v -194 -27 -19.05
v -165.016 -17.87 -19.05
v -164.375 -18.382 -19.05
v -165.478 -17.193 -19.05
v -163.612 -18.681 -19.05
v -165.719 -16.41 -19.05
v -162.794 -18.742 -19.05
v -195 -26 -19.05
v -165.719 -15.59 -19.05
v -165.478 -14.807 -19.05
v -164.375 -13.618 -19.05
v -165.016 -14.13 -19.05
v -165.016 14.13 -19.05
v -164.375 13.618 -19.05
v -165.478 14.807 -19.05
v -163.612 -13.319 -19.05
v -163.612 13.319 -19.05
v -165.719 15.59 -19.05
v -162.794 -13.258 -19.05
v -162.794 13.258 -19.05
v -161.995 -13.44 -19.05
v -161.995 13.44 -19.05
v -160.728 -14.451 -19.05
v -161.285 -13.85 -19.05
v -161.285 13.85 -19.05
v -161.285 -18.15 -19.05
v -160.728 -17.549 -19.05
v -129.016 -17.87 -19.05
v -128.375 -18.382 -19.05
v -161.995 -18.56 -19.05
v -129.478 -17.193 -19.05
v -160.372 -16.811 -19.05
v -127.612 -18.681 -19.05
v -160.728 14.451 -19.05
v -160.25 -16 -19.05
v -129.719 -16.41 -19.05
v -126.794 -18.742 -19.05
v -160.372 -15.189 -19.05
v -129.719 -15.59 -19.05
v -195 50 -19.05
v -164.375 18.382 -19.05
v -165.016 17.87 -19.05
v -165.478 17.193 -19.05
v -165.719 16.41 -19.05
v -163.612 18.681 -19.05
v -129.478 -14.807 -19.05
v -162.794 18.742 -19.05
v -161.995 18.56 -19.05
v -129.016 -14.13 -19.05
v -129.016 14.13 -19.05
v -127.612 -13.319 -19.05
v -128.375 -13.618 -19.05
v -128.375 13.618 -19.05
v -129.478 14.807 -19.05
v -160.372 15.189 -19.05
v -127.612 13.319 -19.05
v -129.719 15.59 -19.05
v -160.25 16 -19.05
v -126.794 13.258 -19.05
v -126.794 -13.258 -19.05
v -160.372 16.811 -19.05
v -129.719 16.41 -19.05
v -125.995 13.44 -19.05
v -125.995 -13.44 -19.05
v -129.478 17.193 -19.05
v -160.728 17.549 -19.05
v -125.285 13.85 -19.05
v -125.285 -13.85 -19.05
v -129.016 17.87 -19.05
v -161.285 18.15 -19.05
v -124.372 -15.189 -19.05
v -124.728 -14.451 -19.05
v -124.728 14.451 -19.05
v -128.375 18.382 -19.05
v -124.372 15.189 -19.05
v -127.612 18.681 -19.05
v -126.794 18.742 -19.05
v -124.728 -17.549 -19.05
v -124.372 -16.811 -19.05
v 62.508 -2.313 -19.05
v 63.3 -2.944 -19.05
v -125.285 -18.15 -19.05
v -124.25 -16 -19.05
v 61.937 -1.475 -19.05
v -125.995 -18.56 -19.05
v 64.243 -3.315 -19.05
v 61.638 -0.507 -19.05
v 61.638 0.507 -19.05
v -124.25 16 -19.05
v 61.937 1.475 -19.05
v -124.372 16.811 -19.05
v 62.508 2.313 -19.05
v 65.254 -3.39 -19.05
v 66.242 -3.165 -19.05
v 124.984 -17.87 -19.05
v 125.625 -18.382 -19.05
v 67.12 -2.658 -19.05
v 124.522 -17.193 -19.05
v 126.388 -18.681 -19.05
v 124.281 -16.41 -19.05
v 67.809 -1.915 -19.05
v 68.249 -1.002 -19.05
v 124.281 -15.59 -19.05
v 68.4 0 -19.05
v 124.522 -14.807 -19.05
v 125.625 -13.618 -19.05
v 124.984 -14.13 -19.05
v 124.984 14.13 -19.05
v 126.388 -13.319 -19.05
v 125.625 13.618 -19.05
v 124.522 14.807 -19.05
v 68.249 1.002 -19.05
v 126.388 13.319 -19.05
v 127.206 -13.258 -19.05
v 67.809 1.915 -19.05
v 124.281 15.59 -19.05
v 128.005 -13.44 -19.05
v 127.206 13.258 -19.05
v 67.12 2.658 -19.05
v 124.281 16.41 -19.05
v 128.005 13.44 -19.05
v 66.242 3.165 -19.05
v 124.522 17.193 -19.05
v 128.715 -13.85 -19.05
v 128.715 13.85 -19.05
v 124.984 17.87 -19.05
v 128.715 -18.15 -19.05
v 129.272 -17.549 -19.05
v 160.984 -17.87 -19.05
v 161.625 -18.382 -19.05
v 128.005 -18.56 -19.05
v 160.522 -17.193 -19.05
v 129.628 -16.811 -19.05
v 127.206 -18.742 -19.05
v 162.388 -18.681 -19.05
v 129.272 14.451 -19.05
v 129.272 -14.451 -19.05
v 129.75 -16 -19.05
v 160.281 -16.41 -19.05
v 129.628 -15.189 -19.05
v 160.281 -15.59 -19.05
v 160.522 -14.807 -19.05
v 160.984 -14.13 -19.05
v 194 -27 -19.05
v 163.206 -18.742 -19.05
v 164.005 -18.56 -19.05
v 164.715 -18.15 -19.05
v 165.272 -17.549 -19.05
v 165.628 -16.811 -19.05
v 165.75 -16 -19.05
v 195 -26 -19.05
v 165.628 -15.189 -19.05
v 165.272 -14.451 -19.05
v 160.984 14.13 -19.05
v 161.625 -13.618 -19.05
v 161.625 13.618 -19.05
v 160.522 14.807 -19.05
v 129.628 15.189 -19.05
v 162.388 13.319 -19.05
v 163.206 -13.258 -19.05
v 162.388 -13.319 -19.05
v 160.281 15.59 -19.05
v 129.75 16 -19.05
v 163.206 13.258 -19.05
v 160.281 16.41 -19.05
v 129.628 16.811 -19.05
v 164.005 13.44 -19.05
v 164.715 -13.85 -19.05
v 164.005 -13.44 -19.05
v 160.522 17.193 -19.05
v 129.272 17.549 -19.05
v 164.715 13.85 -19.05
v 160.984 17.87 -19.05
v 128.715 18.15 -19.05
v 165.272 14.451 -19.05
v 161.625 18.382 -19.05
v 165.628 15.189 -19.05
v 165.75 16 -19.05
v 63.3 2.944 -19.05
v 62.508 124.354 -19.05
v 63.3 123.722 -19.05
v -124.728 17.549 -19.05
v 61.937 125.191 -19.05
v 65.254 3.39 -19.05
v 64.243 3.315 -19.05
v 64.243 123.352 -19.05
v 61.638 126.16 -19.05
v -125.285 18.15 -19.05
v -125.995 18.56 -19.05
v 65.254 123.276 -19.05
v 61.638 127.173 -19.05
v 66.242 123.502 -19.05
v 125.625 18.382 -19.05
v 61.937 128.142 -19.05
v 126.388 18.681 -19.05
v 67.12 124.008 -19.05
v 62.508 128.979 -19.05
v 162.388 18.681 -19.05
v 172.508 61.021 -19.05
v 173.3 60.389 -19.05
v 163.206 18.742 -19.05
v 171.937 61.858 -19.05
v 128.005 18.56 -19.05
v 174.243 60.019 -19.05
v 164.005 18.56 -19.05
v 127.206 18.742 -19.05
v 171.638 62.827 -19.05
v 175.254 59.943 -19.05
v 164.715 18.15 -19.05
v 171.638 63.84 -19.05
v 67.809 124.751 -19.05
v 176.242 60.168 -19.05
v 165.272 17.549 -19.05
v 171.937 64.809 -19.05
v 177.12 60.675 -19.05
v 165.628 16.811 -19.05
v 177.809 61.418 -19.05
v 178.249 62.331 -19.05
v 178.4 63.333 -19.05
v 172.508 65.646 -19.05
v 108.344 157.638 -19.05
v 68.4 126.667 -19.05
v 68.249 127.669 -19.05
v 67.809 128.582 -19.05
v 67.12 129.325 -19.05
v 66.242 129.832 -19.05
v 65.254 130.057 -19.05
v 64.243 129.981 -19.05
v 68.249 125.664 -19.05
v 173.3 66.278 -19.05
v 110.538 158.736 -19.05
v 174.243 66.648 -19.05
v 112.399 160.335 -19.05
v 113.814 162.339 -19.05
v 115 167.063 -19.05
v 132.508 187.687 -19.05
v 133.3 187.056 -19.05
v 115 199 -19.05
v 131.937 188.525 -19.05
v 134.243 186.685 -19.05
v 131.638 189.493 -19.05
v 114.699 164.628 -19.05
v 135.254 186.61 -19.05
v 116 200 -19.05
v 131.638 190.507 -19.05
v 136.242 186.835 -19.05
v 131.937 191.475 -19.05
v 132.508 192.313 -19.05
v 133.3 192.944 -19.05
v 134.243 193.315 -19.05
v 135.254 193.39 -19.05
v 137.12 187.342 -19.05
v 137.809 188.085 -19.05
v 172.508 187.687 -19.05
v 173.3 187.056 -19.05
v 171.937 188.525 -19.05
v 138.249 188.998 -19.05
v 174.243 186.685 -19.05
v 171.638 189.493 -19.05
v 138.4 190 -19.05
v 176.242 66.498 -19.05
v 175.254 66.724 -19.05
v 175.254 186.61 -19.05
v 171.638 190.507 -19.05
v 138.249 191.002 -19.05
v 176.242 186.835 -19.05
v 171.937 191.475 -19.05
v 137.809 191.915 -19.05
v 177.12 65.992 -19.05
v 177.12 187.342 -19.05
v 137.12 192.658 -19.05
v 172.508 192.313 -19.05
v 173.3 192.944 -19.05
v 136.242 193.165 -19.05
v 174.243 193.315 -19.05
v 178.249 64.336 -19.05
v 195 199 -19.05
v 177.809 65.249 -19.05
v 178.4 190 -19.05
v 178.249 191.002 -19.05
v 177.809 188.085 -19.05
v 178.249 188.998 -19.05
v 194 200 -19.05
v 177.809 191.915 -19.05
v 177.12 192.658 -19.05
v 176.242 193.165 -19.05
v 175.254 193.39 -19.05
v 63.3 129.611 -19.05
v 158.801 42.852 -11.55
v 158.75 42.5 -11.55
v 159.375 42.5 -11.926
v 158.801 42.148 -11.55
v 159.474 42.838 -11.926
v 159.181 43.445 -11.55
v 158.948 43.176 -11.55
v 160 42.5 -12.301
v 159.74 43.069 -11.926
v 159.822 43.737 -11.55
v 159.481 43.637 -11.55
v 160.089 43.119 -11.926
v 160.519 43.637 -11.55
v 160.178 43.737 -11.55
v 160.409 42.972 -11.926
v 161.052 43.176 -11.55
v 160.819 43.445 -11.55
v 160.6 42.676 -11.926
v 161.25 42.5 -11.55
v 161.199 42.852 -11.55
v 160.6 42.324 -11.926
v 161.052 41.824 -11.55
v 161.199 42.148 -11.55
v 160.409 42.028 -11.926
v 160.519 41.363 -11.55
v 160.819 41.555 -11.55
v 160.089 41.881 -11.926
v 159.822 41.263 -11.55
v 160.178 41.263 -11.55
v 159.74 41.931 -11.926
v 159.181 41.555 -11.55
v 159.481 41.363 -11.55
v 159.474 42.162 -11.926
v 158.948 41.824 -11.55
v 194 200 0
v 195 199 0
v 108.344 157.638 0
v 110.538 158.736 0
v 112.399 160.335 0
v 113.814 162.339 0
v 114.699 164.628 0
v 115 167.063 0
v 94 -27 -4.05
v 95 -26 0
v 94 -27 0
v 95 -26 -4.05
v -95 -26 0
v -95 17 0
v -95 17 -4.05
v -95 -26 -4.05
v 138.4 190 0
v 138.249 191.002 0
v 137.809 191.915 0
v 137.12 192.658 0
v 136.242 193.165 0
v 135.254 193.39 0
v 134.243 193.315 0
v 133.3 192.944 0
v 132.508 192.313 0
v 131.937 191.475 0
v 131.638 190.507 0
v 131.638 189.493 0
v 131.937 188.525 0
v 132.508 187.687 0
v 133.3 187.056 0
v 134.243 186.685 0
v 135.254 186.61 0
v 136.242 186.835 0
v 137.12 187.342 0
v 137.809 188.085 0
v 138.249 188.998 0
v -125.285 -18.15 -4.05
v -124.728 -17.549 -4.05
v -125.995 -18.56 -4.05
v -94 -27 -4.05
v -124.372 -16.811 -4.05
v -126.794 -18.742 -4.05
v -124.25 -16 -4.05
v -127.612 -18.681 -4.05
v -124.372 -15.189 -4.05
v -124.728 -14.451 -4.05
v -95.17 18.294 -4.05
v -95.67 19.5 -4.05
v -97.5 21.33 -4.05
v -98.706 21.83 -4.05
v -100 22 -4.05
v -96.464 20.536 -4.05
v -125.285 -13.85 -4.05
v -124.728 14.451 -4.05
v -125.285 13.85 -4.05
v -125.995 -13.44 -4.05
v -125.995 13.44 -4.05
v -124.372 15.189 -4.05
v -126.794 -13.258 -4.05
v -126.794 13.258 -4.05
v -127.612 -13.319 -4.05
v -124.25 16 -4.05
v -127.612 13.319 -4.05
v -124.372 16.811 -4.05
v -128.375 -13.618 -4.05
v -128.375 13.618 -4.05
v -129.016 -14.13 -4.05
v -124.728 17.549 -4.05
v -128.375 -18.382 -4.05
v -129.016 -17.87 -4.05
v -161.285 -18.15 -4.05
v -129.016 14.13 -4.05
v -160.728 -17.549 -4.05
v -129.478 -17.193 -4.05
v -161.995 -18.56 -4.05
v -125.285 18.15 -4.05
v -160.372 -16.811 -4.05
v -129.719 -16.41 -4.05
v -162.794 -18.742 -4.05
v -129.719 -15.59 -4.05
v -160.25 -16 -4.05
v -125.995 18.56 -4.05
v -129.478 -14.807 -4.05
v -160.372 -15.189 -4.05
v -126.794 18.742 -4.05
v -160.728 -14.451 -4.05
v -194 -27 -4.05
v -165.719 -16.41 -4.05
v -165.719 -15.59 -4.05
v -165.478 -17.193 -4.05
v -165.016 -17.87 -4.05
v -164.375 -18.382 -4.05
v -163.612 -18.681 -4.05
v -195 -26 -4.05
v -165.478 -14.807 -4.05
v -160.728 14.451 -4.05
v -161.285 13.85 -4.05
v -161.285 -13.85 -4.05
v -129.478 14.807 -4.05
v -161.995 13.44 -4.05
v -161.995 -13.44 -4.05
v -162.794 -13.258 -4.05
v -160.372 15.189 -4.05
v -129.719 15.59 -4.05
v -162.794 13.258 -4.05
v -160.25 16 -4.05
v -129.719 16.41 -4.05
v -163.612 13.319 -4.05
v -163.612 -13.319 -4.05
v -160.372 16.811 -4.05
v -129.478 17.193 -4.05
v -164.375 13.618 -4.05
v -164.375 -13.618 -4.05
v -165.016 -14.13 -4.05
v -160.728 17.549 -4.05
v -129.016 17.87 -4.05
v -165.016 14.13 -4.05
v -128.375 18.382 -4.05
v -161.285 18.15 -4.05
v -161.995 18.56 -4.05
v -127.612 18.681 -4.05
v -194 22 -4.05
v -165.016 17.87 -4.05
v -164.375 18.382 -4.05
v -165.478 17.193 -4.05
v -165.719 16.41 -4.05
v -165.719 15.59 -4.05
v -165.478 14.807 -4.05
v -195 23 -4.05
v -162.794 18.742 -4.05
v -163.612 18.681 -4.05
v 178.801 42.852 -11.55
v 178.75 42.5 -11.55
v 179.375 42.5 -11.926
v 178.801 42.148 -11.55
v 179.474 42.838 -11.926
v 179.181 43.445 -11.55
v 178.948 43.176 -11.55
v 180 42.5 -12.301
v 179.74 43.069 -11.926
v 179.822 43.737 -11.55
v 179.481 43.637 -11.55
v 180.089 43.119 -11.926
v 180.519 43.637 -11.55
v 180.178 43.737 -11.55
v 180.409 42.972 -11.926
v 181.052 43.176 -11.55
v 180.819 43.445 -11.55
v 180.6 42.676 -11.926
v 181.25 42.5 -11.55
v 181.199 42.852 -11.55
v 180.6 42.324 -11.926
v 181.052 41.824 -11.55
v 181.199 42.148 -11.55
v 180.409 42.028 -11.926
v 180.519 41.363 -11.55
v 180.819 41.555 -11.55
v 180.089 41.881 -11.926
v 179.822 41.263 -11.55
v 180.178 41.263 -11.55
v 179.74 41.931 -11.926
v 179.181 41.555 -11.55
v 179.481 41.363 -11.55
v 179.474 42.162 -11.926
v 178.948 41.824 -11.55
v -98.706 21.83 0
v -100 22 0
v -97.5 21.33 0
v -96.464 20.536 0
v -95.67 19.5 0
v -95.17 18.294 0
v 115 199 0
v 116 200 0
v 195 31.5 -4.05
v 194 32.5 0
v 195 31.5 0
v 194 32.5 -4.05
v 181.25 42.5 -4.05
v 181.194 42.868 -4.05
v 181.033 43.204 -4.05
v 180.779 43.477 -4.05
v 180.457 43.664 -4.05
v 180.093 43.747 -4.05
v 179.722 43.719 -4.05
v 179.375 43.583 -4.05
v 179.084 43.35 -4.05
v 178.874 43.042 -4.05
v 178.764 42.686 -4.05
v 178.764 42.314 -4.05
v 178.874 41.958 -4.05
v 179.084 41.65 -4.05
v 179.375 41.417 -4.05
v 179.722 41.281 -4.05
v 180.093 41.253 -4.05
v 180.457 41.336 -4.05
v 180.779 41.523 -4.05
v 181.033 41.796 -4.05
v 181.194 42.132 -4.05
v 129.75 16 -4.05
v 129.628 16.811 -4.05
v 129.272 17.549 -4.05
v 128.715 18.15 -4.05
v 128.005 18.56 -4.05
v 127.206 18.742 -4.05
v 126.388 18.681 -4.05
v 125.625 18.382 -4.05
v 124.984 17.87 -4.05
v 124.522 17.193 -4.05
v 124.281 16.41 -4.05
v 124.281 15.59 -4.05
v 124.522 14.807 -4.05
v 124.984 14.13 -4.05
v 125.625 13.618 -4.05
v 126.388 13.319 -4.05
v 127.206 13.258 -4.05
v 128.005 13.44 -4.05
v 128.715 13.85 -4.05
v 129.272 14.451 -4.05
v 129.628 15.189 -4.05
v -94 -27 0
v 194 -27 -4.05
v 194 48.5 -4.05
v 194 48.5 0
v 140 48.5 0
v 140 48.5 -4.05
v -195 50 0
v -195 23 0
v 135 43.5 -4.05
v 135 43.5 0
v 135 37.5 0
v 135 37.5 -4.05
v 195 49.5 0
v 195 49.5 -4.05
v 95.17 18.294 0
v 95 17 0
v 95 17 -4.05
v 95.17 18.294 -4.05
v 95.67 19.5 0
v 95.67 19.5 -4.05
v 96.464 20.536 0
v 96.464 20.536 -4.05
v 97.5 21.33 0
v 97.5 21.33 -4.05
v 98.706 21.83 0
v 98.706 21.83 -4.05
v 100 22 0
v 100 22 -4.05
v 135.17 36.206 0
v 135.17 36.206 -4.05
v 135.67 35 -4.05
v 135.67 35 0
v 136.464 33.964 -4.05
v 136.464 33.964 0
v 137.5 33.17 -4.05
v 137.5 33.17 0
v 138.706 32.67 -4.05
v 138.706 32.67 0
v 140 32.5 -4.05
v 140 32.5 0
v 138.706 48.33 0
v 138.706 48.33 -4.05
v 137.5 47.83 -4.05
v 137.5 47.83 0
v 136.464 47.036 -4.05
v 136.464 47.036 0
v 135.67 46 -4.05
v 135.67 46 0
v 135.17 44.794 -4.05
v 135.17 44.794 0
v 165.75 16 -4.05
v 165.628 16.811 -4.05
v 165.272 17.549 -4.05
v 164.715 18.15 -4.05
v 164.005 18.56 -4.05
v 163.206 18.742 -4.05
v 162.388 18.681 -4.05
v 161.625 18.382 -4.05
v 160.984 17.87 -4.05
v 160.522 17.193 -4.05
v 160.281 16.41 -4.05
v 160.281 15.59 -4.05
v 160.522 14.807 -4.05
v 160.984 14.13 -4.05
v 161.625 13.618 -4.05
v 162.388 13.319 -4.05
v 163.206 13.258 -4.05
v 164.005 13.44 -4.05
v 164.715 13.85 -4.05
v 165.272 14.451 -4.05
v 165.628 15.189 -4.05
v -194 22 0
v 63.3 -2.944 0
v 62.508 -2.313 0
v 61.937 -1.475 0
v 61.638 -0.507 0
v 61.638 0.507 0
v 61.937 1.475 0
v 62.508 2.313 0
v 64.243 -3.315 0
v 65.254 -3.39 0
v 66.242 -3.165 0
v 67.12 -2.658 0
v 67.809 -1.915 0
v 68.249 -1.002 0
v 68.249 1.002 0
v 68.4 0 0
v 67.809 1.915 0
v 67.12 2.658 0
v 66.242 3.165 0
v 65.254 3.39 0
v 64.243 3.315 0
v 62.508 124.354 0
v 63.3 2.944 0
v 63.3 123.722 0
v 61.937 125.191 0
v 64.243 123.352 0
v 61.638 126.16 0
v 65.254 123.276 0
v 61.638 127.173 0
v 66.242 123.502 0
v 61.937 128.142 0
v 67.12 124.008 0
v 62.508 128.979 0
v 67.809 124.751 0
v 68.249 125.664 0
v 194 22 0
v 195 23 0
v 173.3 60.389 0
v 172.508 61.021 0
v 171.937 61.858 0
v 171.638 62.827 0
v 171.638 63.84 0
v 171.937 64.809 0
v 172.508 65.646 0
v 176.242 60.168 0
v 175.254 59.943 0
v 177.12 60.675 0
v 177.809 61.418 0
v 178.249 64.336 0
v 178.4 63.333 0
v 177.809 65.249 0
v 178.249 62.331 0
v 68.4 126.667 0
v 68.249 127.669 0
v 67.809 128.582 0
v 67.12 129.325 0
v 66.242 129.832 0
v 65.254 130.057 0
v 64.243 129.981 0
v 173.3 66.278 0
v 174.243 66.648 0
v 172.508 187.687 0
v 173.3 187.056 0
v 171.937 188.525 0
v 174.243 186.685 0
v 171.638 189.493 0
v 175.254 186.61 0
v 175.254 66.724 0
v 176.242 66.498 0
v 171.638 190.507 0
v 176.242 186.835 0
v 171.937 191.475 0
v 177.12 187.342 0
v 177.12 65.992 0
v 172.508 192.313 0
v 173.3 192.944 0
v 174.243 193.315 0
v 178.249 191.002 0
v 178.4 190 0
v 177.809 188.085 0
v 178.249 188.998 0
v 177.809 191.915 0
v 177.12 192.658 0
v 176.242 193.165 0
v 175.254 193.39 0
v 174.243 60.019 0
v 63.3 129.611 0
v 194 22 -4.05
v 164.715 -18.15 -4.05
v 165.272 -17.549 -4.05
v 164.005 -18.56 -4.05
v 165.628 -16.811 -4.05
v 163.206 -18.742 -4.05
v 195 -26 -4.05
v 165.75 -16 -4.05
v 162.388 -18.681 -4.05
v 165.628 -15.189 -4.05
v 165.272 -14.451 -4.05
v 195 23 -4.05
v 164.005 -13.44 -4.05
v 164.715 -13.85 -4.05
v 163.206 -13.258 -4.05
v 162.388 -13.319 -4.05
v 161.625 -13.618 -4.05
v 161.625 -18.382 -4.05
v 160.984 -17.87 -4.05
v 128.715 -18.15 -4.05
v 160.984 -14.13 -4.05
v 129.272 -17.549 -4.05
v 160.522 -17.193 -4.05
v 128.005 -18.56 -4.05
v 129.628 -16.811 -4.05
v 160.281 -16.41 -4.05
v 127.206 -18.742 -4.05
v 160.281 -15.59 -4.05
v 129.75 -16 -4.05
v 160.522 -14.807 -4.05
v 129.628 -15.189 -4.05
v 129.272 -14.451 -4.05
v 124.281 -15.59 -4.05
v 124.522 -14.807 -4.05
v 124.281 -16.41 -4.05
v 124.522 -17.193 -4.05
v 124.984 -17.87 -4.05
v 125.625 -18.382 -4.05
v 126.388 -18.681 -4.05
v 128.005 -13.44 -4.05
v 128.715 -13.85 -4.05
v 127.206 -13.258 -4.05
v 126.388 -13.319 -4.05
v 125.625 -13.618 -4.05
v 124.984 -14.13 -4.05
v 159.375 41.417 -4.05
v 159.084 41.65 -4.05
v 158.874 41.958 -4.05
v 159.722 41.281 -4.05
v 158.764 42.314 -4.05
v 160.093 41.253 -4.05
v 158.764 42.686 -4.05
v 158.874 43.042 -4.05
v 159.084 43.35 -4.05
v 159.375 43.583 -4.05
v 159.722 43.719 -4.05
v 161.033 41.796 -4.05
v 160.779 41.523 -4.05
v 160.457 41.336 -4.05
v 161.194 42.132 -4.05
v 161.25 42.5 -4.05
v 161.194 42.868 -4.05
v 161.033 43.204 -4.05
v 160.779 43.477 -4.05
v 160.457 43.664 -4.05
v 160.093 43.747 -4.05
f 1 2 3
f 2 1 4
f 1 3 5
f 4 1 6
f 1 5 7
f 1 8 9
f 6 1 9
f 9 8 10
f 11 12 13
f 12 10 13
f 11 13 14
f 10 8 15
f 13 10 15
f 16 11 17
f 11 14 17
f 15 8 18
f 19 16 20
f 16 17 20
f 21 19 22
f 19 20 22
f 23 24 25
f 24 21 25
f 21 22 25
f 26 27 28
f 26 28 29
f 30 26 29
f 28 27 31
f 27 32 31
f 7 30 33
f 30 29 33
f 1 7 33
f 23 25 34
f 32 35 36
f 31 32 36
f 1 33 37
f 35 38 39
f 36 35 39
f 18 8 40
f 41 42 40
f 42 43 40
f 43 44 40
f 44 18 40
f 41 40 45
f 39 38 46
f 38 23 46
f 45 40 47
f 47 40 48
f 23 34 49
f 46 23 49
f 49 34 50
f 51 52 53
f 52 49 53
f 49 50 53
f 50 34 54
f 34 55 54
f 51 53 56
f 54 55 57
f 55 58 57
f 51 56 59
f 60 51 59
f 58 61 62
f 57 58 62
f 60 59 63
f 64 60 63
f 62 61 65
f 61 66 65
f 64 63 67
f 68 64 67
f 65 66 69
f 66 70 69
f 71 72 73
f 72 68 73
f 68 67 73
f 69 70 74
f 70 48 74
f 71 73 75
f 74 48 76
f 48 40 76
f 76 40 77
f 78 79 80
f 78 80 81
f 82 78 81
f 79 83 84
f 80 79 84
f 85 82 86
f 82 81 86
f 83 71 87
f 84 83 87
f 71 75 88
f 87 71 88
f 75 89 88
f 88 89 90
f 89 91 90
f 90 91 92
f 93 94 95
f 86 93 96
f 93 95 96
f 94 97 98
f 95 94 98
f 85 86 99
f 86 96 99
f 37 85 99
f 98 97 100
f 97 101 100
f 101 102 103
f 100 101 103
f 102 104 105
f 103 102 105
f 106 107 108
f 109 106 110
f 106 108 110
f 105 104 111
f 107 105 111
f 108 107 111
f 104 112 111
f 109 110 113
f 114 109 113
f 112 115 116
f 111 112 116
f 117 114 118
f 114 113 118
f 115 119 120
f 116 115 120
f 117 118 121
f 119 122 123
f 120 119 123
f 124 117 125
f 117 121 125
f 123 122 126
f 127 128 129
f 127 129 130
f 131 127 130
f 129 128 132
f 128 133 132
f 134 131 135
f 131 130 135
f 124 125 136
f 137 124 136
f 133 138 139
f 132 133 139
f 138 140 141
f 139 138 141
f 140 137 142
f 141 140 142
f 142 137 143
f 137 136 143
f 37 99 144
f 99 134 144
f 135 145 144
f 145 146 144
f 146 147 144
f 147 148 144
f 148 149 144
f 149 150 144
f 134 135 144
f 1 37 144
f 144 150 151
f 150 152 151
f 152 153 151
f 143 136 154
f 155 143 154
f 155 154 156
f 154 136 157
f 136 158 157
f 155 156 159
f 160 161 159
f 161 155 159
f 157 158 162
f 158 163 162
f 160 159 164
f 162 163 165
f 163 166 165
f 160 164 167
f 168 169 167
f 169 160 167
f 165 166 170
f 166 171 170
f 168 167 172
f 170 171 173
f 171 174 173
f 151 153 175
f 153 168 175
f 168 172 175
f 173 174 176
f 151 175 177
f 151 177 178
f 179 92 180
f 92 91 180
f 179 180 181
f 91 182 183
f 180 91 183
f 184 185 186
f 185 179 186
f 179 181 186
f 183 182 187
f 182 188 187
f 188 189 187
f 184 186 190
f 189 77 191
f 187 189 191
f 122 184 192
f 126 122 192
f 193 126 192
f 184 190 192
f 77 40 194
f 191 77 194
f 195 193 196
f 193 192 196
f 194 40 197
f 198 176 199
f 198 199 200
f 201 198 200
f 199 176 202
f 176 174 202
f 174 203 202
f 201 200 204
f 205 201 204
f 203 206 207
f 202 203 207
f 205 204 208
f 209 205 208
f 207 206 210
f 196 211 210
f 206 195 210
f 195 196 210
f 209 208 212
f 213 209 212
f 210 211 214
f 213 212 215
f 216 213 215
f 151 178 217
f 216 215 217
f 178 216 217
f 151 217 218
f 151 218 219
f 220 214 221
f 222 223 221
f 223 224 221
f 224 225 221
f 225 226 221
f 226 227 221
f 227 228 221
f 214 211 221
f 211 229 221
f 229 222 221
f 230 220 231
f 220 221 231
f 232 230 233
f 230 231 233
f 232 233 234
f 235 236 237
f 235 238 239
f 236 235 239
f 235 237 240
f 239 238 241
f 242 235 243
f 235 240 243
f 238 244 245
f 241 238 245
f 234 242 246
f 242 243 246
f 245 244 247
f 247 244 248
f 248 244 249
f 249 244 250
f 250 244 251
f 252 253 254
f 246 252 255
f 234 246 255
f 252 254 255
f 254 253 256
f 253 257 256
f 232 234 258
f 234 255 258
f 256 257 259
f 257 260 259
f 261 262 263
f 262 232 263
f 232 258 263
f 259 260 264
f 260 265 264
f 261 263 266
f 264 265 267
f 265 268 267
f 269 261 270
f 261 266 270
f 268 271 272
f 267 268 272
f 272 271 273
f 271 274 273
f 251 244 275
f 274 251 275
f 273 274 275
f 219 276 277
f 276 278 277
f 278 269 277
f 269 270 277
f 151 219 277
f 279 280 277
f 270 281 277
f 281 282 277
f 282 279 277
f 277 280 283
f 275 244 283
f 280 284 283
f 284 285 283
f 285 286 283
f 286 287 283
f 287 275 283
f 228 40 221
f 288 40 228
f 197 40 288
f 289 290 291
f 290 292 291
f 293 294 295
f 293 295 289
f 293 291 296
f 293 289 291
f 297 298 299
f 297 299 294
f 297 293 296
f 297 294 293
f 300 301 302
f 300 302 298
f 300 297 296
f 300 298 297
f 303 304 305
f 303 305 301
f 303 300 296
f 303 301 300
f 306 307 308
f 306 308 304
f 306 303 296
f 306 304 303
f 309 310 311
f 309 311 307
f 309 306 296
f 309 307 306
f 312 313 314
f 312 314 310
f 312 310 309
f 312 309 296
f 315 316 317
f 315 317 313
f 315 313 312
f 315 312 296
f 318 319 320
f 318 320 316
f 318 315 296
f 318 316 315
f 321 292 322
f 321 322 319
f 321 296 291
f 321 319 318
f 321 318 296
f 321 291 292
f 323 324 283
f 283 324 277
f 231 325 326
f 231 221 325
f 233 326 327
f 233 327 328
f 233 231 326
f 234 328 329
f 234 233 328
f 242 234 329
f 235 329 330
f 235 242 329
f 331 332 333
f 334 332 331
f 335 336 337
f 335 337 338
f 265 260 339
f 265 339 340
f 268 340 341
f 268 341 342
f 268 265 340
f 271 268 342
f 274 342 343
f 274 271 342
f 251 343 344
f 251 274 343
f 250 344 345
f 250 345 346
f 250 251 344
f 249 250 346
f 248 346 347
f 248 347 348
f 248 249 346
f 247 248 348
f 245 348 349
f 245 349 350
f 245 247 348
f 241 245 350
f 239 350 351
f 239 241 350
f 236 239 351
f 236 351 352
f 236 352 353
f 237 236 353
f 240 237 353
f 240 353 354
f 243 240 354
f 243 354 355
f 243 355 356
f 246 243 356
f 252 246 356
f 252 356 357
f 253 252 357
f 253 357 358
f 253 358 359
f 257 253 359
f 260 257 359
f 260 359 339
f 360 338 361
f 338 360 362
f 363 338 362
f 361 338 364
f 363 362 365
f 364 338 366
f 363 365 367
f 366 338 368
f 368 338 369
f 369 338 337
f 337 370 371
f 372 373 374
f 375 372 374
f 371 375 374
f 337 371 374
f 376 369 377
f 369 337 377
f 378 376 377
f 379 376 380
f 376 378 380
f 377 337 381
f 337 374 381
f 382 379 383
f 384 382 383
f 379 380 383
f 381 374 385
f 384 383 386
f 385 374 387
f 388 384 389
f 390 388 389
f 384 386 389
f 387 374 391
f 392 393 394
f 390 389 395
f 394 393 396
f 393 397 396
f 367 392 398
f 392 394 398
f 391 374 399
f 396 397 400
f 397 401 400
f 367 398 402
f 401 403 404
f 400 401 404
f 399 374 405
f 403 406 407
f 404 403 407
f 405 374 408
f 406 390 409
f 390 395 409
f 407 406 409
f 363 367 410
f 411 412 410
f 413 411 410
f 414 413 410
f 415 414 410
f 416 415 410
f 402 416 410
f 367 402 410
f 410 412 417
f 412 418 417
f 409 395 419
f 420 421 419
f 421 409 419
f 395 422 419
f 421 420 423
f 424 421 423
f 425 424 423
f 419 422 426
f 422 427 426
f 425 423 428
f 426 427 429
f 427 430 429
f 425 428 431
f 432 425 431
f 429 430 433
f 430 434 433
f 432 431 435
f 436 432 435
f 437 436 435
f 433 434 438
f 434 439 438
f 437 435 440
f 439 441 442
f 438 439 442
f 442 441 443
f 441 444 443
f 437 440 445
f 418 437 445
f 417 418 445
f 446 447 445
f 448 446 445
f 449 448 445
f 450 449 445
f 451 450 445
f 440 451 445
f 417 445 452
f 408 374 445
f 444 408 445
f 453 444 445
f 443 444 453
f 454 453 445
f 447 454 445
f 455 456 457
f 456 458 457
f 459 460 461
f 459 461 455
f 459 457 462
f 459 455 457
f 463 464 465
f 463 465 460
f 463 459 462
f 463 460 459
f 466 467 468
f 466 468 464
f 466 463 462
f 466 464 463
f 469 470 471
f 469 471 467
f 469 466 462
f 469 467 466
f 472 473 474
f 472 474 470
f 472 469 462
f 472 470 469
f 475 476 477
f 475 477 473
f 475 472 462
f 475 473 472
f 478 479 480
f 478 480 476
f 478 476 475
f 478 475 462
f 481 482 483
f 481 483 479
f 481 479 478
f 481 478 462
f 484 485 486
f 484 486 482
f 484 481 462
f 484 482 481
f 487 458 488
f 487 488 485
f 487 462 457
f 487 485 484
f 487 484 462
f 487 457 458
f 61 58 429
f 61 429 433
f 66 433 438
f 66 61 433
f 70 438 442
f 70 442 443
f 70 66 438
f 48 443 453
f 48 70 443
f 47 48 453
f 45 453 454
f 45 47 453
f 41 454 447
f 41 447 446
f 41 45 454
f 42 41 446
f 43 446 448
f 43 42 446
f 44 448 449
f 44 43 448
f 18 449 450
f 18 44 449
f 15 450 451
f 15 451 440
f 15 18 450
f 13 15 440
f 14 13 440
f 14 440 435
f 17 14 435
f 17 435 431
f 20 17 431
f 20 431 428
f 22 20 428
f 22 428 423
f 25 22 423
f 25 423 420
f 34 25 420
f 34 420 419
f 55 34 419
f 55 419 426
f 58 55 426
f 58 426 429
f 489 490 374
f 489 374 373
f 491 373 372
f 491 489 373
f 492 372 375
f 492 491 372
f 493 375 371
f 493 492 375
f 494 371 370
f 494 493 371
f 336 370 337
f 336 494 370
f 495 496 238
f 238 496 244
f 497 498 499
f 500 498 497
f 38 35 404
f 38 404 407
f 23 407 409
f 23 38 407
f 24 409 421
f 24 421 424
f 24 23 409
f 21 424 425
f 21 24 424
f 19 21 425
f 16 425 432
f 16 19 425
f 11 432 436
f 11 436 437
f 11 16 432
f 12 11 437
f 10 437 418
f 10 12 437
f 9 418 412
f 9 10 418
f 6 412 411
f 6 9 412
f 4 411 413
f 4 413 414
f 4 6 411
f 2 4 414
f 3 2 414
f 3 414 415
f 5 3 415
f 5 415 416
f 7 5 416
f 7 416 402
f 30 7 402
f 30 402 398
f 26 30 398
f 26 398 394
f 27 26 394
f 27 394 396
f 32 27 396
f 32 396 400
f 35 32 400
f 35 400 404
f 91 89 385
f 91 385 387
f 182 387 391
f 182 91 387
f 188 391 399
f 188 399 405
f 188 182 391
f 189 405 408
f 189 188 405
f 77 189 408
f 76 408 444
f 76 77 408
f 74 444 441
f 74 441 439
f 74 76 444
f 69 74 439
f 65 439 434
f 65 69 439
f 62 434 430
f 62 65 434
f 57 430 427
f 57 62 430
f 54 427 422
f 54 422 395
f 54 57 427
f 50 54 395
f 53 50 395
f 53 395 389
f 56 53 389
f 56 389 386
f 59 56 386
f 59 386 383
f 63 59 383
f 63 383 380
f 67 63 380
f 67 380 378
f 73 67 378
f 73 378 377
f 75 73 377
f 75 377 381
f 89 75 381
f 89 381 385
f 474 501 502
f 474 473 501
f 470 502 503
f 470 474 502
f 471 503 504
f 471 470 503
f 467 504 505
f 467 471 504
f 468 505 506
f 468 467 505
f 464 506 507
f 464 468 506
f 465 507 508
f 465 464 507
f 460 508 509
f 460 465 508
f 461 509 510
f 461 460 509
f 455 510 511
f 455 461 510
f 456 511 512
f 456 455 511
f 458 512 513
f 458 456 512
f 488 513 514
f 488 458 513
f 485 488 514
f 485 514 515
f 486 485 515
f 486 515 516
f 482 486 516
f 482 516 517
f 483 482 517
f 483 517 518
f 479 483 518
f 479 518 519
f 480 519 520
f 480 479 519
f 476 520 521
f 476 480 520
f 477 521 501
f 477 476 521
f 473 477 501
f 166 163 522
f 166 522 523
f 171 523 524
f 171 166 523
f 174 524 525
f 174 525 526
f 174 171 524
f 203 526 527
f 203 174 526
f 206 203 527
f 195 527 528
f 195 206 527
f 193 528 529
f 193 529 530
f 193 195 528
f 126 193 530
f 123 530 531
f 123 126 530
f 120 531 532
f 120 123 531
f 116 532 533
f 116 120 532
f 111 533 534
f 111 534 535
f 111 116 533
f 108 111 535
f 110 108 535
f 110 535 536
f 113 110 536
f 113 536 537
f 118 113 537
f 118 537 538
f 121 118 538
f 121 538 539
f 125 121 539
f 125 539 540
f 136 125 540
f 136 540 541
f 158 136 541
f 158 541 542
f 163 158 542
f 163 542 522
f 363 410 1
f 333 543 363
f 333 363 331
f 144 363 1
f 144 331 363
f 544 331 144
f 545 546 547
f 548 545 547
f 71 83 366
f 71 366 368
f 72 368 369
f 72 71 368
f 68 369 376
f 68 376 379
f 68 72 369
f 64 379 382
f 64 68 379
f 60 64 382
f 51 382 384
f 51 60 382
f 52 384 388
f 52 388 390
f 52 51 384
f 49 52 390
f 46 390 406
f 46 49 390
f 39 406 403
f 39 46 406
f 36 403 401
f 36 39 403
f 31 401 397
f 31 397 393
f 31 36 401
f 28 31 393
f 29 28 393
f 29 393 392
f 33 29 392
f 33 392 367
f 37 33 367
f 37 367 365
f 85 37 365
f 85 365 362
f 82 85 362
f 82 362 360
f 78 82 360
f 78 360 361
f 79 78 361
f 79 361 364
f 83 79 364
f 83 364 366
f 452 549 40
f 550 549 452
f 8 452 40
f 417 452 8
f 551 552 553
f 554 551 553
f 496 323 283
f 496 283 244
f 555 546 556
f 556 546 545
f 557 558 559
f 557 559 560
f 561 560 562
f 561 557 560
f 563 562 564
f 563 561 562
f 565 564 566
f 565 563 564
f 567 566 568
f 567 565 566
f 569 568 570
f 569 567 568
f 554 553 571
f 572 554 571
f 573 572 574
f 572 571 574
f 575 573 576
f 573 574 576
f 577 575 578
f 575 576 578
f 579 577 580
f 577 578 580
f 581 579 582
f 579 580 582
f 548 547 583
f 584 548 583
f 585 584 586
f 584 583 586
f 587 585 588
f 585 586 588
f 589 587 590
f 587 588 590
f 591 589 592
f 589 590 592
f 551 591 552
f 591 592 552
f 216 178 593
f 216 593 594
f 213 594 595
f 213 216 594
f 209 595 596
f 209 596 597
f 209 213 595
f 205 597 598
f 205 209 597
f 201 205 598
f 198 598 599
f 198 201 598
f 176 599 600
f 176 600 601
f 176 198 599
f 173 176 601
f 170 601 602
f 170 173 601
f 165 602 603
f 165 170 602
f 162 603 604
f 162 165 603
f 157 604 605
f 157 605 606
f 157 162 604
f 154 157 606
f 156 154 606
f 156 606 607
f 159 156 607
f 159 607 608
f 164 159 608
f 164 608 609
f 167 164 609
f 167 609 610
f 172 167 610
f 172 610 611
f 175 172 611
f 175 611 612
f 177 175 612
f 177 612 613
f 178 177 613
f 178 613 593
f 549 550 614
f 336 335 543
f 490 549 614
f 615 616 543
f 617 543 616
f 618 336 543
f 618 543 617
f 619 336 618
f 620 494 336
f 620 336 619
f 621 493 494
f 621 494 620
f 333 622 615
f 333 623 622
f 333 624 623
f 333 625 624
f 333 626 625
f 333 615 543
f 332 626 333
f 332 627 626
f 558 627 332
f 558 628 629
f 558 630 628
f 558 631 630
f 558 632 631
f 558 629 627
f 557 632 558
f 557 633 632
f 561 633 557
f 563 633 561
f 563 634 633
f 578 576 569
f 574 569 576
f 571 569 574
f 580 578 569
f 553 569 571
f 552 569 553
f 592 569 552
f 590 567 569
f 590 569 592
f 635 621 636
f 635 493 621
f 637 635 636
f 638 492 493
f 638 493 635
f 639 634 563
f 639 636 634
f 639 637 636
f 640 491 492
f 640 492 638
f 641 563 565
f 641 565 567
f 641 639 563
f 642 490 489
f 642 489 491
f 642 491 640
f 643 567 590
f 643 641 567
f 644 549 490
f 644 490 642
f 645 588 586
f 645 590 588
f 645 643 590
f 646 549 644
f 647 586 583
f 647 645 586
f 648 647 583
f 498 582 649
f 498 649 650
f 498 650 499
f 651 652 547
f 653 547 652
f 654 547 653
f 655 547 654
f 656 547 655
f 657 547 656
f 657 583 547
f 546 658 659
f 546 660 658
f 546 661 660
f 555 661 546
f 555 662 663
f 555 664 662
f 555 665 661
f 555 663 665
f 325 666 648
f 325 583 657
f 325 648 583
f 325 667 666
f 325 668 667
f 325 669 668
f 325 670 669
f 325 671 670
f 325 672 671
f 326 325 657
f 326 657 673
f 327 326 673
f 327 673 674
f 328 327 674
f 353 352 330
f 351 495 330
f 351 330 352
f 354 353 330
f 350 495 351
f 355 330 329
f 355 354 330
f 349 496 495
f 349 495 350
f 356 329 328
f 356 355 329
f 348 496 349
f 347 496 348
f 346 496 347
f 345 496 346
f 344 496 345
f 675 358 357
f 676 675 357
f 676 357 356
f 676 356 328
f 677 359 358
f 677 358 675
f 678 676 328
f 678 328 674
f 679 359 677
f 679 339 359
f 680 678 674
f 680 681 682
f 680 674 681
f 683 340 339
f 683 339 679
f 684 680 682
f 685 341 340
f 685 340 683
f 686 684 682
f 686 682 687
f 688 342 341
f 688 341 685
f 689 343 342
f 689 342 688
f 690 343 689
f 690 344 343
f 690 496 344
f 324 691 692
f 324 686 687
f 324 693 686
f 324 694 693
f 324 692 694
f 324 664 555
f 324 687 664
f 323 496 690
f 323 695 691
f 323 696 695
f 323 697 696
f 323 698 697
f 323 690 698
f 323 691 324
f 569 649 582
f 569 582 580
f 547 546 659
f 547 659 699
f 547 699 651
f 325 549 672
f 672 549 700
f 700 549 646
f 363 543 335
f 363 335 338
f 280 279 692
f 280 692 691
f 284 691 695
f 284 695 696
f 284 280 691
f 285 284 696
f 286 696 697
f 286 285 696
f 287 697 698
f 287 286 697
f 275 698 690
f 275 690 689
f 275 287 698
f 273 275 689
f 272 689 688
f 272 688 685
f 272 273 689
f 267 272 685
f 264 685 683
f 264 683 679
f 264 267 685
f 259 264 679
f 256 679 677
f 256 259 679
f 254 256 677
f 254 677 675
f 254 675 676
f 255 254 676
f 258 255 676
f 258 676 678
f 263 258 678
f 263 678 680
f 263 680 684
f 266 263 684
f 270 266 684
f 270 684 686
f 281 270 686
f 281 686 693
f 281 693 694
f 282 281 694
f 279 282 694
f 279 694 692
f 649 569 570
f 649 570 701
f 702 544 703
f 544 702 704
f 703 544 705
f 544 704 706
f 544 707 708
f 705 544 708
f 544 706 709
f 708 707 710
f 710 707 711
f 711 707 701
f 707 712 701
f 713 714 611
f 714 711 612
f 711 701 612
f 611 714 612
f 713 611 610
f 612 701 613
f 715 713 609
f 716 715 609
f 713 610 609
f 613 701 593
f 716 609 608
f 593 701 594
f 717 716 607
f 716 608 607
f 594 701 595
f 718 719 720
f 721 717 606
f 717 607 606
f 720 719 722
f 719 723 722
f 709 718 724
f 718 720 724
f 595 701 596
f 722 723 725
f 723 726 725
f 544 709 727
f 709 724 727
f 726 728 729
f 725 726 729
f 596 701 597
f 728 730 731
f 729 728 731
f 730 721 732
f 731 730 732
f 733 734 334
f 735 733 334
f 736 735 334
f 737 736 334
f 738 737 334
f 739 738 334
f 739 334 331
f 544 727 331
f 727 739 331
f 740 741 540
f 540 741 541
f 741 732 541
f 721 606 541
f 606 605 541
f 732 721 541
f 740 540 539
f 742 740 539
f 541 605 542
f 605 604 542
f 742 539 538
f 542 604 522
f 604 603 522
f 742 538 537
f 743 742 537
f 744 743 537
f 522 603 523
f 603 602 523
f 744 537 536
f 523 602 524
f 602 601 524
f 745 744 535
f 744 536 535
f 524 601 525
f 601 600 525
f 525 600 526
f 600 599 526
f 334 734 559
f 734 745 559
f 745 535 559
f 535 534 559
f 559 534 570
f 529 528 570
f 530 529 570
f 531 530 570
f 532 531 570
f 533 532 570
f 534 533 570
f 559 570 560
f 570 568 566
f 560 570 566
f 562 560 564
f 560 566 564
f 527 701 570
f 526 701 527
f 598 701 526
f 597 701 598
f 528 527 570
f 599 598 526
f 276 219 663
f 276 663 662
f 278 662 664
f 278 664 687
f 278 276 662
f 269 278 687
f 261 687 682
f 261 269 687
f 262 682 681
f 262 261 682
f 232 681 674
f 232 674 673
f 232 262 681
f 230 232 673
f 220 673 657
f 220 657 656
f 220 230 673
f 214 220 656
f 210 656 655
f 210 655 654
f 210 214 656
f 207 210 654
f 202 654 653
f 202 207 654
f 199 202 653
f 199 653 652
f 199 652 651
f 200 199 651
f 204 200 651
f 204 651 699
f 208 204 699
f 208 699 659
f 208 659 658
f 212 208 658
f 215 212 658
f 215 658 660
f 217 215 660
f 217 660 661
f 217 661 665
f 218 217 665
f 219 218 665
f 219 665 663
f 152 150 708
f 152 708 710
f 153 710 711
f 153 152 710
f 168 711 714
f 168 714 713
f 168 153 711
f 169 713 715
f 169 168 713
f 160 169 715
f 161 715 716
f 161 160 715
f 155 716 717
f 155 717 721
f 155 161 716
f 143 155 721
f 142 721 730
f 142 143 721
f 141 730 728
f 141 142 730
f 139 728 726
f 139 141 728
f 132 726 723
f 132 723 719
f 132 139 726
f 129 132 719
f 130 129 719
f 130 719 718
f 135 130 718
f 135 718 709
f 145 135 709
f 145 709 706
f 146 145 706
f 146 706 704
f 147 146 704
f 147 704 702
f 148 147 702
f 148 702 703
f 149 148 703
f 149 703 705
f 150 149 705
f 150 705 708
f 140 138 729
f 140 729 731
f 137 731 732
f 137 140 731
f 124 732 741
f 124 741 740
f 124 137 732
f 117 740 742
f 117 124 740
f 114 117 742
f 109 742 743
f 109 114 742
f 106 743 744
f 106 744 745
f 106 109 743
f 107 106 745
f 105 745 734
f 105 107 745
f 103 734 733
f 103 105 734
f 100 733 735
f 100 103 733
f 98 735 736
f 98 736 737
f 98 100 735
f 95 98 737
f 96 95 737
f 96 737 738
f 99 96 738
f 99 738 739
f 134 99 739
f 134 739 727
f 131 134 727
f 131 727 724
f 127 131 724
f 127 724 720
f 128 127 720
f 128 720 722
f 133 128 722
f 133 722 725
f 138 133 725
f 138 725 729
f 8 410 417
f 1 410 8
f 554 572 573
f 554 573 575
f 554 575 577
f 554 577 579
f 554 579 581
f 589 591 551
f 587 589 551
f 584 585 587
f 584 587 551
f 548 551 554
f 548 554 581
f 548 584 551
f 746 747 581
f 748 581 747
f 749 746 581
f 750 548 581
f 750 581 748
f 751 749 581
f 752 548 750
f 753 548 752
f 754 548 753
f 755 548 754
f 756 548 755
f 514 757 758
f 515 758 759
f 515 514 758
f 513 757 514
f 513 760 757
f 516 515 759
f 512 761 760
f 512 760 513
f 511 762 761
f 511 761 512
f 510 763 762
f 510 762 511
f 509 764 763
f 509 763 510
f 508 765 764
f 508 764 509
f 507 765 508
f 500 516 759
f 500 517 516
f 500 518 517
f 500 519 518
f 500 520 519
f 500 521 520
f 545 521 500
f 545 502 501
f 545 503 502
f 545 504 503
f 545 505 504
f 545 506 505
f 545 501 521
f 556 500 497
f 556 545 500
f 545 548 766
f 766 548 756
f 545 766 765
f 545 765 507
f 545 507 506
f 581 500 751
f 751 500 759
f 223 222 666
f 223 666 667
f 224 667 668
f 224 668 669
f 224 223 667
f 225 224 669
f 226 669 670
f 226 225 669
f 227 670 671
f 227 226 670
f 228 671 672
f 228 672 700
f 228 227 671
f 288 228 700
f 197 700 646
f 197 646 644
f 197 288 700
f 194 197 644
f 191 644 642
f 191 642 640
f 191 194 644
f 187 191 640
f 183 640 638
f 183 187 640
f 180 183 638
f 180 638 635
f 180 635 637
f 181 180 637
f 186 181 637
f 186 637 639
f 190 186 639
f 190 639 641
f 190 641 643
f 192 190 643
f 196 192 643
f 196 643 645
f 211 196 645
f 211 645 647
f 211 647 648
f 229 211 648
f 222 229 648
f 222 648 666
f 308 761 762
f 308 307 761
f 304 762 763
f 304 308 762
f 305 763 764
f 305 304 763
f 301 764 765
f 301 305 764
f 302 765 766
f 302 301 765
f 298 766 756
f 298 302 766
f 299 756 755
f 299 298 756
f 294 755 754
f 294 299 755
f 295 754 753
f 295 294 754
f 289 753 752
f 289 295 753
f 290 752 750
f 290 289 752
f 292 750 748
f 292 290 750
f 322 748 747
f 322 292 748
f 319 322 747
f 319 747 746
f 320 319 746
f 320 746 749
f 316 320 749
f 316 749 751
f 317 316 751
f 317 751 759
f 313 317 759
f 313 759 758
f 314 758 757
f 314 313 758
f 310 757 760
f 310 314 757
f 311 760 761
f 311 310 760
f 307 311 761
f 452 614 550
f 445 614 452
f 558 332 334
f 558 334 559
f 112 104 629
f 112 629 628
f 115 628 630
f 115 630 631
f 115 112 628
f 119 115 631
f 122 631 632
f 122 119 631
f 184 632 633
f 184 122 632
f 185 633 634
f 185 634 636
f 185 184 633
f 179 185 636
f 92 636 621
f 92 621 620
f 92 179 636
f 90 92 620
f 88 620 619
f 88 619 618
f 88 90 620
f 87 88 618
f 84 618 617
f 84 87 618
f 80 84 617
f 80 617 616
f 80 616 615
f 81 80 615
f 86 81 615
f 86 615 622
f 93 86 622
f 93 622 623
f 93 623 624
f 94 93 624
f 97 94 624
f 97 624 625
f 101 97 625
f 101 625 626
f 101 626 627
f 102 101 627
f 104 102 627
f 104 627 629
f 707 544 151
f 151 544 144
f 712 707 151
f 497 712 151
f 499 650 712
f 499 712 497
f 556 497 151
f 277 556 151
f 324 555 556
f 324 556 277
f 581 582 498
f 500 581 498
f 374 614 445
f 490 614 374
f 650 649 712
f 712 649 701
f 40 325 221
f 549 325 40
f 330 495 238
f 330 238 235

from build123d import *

# Parameters (mm, degrees)
BOSS_EXTRUDE1_DEPTH       = 19.05
CUT_EXTRUDE2_DEPTH        = 4.05
M5_CLEARANCE_HOLE1_D      = 5.5
M5_CLEARANCE_HOLE2_D      = 5.5
M3X0_5_TAPPED_HOLE1_D     = 2.5
M3X0_5_TAPPED_HOLE1_DEPTH = 7.5
M3X0_5_TAPPED_HOLE1_TIP   = 0.751075774
M8X1_25_TAPPED_HOLE1_D    = 6.8
FILLET1_R                 = 10
CHAMFER1_SIZE             = 1


with BuildPart() as part:
    # Sketch1 → Boss-Extrude1 (new body)
    with BuildSketch(Plane.XY):
        Polygon((-195, 50), (-195, -27), (195, -27), (195, 200), (115, 200), (115, 160), align=None)
    extrude(amount=BOSS_EXTRUDE1_DEPTH)

    # Sketch2 → Cut-Extrude2 (cut)
    with BuildSketch(Plane(origin=(0, 0, 0), x_dir=(-1, 0, 0), z_dir=(0, 0, -1))):
        with BuildLine():
            Line((-195, -27), (-95, -27))
            Line((-95, -27), (-95, 17))
            ThreePointArc((-95, 17), (-96.464466094, 20.535533906), (-100, 22))
            Line((-100, 22), (-195, 22))
            Line((-195, 22), (-195, -27))
        make_face()
        with BuildLine():
            Line((195, -27), (195, 22))
            Line((195, 22), (100, 22))
            ThreePointArc((100, 22), (96.464466094, 20.535533906), (95, 17))
            Line((95, 17), (95, -27))
            Line((95, -27), (195, -27))
        make_face()
        with BuildLine():
            Line((-195, 48.5), (-140, 48.5))
            ThreePointArc((-140, 48.5), (-136.464466094, 47.035533906), (-135, 43.5))
            Line((-135, 43.5), (-135, 37.5))
            ThreePointArc((-135, 37.5), (-136.464466094, 33.964466094), (-140, 32.5))
            Line((-140, 32.5), (-195, 32.5))
            Line((-195, 32.5), (-195, 48.5))
        make_face()
    extrude(amount=-CUT_EXTRUDE2_DEPTH, mode=Mode.SUBTRACT)

    # M5 Clearance Hole1 (through all)
    with Locations(Plane(origin=(0, 0, 4.05), x_dir=(-1, 0, 0), z_dir=(0, 0, -1))):
        with Locations((127, 16), (163, 16), (163, -16), (127, -16)):
            Hole(M5_CLEARANCE_HOLE1_D / 2)

    # M5 Clearance Hole2 (through all)
    with Locations(Plane(origin=(0, 0, 4.05), x_dir=(-1, 0, 0), z_dir=(0, 0, -1))):
        with Locations((-163, 16), (-127, 16), (-127, -16), (-163, -16)):
            Hole(M5_CLEARANCE_HOLE2_D / 2)

    # M3x0.5 Tapped Hole1
    with Locations(Plane(origin=(0, 0, 4.05), x_dir=(-1, 0, 0), z_dir=(0, 0, -1))):
        with Locations((-180, 42.5), (-160, 42.5)):
            Hole(M3X0_5_TAPPED_HOLE1_D / 2, depth=M3X0_5_TAPPED_HOLE1_DEPTH)
            with Locations((0, 0, -(M3X0_5_TAPPED_HOLE1_DEPTH + M3X0_5_TAPPED_HOLE1_TIP / 2))):  # 118° drill point
                Cone(0, M3X0_5_TAPPED_HOLE1_D / 2, M3X0_5_TAPPED_HOLE1_TIP, mode=Mode.SUBTRACT)

    # M8x1.25 Tapped Hole1 (through all)
    with Locations(Plane(origin=(0, 0, 0), x_dir=(-1, 0, 0), z_dir=(0, 0, -1))):
        with Locations((-175, 190), (-135, 190), (-65, 126.666666667), (-175, 63.333333333), (-65, 0)):
            Hole(M8X1_25_TAPPED_HOLE1_D / 2)

    # Fillet1
    fillet1_edges = [part.edges().sort_by_distance(p)[0] for p in [
        (115, 160, 9.525),
    ]]
    fillet(fillet1_edges, radius=FILLET1_R)

    # Chamfer1
    chamfer1_edges = [part.edges().sort_by_distance(p)[0] for p in [
        (115, 200, 9.525),
        (195, 200, 9.525),
        (195, -27, 11.55),
        (-195, -27, 11.55),
        (195, 48.5, 2.025),
        (195, 32.5, 2.025),
        (-95, -27, 2.025),
        (-195, 22, 2.025),
        (95, -27, 2.025),
        (195, 22, 2.025),
    ]]
    chamfer(chamfer1_edges, length=CHAMFER1_SIZE)


with BuildPart() as body_2:
    # Mirror1: mirrored copy
    add(part.part.mirror(Plane.XY))


solid = body_2.part
